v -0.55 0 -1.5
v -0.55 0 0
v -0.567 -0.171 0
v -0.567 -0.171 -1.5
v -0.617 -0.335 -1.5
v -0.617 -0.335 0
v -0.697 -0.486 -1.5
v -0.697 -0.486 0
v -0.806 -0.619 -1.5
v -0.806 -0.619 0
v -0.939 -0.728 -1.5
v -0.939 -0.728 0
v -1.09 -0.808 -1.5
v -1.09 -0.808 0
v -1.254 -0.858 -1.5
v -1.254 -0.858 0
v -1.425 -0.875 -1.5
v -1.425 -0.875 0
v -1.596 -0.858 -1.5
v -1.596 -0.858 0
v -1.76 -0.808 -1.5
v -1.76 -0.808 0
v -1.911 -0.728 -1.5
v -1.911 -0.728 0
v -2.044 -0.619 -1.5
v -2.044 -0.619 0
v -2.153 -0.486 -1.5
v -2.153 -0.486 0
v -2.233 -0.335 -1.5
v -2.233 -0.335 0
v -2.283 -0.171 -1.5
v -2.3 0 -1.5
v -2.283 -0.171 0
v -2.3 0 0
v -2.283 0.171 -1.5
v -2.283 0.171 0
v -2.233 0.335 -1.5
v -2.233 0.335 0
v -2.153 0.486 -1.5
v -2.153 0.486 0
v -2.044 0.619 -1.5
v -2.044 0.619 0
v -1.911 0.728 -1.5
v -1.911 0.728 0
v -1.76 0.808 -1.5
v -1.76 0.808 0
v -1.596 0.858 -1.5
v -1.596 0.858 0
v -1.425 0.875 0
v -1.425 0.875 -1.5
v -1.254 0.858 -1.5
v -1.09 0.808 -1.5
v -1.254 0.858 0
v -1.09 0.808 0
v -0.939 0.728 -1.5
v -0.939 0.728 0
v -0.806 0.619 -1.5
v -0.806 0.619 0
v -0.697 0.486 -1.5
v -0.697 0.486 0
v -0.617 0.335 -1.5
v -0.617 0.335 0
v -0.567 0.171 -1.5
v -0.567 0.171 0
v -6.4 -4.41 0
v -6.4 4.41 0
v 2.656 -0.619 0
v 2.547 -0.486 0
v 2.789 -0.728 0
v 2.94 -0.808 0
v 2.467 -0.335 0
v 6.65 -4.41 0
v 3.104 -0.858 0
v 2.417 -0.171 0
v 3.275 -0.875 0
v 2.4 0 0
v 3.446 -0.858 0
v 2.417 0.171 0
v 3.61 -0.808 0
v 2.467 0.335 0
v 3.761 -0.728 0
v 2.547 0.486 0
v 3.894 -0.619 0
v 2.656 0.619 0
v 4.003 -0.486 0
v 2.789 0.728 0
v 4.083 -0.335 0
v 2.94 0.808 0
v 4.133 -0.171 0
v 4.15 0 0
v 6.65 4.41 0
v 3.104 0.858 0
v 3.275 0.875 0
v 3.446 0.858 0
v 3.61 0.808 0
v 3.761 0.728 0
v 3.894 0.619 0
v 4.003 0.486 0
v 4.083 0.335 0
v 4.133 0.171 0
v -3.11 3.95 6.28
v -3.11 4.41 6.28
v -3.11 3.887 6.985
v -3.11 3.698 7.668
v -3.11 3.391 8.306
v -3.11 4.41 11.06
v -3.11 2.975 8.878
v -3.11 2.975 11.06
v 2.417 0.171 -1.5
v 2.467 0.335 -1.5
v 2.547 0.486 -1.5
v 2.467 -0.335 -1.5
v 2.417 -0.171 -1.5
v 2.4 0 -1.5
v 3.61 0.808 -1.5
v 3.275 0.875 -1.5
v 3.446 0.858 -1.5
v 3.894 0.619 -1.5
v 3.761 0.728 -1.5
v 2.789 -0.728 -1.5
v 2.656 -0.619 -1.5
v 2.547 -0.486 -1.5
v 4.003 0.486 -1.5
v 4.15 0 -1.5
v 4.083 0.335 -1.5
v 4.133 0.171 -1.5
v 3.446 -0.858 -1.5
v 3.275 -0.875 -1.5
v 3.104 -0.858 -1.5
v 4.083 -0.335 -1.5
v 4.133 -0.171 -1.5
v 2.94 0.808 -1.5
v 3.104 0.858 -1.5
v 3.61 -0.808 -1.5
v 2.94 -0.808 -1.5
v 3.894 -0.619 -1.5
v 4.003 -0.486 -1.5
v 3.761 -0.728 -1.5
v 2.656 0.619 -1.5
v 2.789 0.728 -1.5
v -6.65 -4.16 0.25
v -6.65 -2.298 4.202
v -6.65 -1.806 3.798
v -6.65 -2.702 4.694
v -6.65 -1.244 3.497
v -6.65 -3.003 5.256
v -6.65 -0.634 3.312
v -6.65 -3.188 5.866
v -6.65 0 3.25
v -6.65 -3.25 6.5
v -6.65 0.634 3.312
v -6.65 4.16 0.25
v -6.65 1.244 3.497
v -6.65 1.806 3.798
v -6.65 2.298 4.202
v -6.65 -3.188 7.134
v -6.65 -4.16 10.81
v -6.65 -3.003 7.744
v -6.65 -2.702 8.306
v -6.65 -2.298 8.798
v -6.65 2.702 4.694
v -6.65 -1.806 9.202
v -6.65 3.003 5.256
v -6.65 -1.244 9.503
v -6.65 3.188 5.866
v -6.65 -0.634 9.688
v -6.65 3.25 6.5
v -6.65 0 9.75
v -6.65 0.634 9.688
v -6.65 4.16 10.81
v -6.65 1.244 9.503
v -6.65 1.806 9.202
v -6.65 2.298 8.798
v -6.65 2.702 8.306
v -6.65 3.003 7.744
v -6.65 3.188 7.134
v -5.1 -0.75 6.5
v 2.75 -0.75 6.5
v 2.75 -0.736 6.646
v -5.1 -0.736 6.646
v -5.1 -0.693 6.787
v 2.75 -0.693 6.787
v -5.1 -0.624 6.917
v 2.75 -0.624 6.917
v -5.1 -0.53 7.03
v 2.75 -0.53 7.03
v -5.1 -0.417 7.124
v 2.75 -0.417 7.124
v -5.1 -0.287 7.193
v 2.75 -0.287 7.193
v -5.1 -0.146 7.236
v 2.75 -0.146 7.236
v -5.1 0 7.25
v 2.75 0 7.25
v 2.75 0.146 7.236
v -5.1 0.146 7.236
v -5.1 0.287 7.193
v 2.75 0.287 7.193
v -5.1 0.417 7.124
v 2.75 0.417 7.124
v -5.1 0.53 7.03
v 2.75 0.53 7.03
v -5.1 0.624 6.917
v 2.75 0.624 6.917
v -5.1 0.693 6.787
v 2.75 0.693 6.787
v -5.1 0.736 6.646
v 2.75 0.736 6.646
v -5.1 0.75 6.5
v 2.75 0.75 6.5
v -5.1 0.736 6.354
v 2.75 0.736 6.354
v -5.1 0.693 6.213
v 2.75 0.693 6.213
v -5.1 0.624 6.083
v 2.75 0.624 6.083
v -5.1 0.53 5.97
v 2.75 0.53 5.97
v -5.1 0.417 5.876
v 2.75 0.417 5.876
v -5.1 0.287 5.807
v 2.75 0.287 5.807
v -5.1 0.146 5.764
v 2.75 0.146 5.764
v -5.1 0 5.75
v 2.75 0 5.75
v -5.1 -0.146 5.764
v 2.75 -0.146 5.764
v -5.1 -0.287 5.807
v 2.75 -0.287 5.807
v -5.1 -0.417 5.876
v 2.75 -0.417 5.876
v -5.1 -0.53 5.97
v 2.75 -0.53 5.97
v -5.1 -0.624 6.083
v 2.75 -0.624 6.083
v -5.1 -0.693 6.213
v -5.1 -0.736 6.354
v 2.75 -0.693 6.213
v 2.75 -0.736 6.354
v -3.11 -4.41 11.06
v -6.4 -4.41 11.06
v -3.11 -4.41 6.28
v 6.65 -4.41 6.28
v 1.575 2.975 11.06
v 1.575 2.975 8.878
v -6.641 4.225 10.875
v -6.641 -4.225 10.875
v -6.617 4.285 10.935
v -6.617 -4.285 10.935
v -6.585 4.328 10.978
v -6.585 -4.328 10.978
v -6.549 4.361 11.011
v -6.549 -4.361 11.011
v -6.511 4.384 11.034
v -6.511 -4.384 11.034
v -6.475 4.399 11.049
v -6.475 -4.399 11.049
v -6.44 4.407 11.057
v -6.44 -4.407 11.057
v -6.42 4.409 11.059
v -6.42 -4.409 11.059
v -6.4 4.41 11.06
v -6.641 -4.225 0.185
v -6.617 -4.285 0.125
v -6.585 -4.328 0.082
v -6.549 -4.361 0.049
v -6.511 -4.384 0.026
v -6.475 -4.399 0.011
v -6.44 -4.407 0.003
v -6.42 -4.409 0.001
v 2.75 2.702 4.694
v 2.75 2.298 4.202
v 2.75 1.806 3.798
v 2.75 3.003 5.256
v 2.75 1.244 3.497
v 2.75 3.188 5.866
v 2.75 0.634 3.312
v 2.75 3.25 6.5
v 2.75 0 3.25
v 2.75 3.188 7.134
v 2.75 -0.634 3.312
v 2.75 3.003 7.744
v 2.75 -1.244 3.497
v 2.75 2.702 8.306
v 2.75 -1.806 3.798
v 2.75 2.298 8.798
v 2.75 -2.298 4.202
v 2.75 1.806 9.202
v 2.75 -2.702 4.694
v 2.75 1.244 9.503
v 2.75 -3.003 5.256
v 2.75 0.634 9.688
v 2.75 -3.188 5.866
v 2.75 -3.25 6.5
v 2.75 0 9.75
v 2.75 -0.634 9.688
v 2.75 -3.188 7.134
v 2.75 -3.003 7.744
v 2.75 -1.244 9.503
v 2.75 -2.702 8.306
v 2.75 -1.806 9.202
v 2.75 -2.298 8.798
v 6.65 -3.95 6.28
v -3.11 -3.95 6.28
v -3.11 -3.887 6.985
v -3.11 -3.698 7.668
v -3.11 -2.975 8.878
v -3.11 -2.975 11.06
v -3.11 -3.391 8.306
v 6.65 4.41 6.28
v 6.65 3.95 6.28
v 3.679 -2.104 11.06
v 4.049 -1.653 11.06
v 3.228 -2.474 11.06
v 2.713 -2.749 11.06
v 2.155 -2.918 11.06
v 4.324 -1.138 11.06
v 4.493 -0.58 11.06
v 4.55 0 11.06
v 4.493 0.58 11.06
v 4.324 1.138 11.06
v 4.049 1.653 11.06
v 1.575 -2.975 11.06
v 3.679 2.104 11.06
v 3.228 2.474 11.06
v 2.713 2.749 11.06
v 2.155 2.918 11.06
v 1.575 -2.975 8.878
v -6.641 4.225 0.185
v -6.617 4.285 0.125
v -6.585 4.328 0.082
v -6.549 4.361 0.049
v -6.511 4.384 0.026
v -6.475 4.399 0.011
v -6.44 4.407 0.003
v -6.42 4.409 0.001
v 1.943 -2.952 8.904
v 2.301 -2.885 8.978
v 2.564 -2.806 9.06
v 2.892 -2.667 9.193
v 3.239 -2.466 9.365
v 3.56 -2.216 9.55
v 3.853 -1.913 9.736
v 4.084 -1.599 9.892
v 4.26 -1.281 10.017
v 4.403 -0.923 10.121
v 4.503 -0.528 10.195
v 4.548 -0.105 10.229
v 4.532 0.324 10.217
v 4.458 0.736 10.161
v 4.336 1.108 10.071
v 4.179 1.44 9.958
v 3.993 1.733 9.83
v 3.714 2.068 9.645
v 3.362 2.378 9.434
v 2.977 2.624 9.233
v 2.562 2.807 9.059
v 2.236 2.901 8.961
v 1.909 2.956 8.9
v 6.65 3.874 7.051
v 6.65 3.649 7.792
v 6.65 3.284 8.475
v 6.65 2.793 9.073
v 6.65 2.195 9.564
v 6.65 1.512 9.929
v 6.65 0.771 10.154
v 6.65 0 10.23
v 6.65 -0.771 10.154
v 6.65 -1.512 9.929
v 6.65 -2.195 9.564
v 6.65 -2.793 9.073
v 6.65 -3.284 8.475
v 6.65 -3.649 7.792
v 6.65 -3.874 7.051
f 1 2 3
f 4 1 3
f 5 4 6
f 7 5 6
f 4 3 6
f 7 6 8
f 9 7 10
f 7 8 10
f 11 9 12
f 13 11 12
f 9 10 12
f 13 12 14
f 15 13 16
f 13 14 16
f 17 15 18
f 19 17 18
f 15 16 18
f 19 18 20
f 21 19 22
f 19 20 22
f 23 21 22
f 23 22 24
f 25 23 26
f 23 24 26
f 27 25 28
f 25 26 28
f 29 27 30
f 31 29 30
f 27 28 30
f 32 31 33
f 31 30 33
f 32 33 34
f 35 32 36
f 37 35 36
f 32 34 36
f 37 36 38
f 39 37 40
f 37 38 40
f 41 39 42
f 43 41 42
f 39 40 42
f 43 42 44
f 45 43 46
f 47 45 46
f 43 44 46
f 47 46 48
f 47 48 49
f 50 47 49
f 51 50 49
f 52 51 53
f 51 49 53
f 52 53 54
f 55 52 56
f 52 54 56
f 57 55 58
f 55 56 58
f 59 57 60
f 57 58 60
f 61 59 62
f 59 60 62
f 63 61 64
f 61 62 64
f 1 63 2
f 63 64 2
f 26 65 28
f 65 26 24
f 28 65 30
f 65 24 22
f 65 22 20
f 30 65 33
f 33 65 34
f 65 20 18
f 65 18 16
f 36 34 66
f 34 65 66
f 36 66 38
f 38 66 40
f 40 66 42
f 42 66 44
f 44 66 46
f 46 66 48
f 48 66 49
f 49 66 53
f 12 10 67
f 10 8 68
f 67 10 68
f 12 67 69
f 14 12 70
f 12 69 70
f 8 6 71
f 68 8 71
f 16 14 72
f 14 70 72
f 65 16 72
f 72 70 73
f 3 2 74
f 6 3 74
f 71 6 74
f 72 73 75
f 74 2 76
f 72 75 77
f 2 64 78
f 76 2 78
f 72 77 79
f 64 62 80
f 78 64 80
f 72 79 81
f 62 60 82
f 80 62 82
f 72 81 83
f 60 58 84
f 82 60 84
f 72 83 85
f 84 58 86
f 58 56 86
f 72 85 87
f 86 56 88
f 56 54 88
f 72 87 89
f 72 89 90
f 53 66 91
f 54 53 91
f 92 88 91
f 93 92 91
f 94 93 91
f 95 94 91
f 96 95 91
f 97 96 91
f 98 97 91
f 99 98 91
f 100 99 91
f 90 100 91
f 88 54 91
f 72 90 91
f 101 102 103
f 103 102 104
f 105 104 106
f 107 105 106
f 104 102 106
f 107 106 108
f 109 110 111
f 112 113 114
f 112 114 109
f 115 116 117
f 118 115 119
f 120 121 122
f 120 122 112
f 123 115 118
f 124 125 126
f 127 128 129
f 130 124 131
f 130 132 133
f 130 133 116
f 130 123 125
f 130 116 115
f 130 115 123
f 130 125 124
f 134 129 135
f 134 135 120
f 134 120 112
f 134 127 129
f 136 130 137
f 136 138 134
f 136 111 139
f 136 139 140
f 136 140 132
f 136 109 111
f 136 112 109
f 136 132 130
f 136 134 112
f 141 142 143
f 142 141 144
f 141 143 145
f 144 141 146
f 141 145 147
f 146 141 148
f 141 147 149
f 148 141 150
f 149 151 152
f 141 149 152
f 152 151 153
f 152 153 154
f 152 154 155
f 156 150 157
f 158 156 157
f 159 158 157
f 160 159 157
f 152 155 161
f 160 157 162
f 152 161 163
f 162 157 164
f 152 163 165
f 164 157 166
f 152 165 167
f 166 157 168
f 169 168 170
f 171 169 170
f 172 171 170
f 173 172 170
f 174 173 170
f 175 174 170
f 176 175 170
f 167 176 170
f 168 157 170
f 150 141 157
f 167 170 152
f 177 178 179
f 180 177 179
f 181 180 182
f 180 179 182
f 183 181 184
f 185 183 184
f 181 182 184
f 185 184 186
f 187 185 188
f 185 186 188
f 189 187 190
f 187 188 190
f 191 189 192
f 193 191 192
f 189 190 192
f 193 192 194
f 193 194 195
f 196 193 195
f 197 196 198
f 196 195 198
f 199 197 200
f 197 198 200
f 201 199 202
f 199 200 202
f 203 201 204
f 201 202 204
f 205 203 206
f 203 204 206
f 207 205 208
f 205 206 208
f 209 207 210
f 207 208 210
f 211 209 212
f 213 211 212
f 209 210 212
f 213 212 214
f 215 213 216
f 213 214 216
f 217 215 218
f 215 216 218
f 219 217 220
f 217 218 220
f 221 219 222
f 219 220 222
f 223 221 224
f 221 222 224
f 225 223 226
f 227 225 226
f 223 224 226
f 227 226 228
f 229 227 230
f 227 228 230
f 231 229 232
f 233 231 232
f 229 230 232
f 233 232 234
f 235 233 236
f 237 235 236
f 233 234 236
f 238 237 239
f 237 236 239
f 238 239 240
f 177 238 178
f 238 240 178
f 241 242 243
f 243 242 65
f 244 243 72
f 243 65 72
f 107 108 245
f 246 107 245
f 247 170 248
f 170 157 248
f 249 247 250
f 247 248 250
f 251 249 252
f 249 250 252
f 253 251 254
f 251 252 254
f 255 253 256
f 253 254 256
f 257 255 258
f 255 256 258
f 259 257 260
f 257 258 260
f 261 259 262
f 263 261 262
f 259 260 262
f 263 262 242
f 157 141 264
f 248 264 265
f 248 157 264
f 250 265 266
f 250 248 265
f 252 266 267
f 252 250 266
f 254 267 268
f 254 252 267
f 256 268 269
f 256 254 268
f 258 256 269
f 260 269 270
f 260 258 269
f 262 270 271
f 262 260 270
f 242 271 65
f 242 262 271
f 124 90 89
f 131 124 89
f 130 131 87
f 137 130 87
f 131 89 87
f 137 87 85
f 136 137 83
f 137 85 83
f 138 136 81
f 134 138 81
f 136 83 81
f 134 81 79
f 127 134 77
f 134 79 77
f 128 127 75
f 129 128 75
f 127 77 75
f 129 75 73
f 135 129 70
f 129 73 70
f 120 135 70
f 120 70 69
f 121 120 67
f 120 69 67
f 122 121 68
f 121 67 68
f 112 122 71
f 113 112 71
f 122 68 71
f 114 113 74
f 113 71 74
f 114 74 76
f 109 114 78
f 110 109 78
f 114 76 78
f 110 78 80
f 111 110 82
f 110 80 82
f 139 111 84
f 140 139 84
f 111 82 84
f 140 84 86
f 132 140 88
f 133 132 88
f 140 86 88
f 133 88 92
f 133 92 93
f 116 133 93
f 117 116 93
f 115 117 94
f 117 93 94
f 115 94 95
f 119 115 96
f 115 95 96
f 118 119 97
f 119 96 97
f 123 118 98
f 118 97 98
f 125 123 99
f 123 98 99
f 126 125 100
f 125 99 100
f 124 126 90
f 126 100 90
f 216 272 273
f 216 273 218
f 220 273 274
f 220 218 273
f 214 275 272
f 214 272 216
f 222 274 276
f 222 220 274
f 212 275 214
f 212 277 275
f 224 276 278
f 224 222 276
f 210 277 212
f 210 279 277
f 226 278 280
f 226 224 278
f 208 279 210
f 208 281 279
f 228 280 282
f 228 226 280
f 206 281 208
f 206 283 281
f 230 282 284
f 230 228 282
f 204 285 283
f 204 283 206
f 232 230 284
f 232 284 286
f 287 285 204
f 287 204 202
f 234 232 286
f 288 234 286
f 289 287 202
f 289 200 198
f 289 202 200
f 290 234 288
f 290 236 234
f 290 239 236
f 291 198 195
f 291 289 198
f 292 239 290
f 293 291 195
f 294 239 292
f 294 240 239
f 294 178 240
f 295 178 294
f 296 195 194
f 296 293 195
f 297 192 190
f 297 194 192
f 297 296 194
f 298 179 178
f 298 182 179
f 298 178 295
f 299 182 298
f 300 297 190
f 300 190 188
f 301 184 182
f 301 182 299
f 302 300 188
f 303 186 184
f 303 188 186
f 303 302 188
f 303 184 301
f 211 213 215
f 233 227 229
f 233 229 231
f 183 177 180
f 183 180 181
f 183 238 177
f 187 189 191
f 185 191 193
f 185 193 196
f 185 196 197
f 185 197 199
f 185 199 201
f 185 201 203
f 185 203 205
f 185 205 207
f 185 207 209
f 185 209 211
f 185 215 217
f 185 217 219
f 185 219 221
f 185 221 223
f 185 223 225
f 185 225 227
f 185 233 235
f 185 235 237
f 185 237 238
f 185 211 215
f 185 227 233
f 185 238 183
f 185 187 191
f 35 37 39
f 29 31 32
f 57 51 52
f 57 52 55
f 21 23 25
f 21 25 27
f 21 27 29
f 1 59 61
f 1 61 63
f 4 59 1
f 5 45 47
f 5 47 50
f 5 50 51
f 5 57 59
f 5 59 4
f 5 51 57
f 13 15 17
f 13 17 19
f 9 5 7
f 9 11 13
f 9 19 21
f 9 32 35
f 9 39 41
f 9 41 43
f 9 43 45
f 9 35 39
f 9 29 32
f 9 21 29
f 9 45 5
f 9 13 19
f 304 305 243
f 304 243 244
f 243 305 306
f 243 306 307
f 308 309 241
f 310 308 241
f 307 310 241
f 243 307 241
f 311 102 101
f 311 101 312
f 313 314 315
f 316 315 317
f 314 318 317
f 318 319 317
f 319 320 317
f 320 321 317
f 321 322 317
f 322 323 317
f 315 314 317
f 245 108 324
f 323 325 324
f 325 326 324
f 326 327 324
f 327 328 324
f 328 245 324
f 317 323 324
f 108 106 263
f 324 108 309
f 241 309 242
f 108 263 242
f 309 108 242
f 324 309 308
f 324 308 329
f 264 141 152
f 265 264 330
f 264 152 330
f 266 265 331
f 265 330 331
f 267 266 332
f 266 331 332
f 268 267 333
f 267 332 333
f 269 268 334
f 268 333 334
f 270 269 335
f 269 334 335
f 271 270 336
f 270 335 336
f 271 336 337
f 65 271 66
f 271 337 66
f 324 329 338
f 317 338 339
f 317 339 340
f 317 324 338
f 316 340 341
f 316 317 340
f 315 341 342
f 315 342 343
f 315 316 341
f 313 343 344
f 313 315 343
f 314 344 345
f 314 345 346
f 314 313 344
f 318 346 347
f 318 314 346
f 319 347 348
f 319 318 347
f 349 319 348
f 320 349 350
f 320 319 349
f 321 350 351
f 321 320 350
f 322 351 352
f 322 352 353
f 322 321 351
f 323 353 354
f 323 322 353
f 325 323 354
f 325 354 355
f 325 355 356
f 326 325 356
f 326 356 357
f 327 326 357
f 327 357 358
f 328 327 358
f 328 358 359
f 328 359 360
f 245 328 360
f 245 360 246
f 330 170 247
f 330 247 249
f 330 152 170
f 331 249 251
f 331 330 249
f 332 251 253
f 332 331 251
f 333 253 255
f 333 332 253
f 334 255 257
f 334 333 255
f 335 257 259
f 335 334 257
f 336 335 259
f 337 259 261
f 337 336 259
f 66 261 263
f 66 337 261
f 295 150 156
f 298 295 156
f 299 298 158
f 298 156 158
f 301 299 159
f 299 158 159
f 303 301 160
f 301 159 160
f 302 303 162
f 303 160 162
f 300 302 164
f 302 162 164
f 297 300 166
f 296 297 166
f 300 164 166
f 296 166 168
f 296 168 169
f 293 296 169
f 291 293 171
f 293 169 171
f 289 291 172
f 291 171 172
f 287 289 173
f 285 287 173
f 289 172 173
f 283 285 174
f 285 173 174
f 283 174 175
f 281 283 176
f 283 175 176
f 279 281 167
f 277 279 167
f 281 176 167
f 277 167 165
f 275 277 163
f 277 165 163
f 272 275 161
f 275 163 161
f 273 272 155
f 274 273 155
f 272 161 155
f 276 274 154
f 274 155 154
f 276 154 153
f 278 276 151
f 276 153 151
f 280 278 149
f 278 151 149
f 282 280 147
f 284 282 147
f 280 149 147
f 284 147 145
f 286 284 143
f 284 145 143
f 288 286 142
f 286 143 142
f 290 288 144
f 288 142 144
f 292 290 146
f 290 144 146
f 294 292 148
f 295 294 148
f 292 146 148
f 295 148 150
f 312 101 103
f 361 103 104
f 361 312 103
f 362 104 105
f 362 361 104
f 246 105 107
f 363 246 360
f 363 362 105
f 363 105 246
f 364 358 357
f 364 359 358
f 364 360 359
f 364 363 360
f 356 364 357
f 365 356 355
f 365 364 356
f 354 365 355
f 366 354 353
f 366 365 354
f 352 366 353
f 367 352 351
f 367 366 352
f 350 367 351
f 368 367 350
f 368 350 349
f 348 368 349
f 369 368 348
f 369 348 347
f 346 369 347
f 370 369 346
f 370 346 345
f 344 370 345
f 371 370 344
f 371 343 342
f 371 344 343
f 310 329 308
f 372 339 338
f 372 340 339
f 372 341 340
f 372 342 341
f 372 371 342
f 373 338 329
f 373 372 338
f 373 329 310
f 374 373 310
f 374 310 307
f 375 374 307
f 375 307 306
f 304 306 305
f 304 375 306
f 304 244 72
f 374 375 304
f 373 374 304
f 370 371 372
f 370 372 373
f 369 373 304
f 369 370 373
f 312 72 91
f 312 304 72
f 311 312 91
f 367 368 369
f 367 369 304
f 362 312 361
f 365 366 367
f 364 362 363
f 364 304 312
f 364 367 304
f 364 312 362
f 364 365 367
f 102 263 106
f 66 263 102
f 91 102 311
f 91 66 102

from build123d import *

# Parameters (mm, degrees)
F0_W      = 13.3
F0_H      = 8.82
F1_DEPTH  = 6.28
F2_R      = 3.95
F3_DEPTH  = 13.3
F4_W      = 8.82
F4_H      = 11.06
F5_DEPTH  = 3.54
F6_R      = 0.25
F7_W      = 4.685
F7_H      = 5.95
F9_R      = 3.25
F10_DEPTH = 9.4
F11_R     = 0.75
F12_DEPTH = 7.85
F13_R     = 0.875
F14_DEPTH = 1.5


with BuildPart() as f1:
    # F0 (on Top) → F1 (new body)
    with BuildSketch(Plane.XY):
        Rectangle(F0_W, F0_H)
    extrude(amount=F1_DEPTH)

    # F2 (on face) → F3 (join, through all)
    with BuildSketch(Plane.YZ.offset(6.65)):
        with Locations((0, 6.28)):
            Circle(F2_R)
    extrude(amount=-F3_DEPTH)

    # F4 (on face) → F5 (join)
    with BuildSketch(Plane(origin=(-6.65, 0, 0), x_dir=(0, -1, 0), z_dir=(-1, 0, 0))):
        with Locations((0, 5.53)):
            Rectangle(F4_W, F4_H)
    extrude(amount=-F5_DEPTH)

    # F6
    f6_edges = [f1.edges().sort_by_distance(p)[0] for p in [
        (-6.65, 0, 11.06),
        (-6.65, 4.41, 5.53),
        (-6.65, 0, 0),
        (-6.65, -4.41, 5.53),
    ]]
    fillet(f6_edges, radius=F6_R)

    # F7 (on face) → F8 (join, up to the next surface of F1)
    with BuildSketch(Plane.XY.offset(11.06)):
        with Locations((-0.7675, 0)):
            Rectangle(F7_W, F7_H)
        with BuildLine():
            Line((1.575, 2.975), (1.575, -2.975))
            ThreePointArc((1.575, -2.975), (4.55, 0), (1.575, 2.975))
        make_face()
    extrude(until=Until.NEXT, dir=(0, 0, -1))

    # F9 (on face) → F10 (cut)
    with BuildSketch(Plane(origin=(-6.65, 0, 0), x_dir=(0, -1, 0), z_dir=(-1, 0, 0))):
        with Locations((0, 6.5)):
            Circle(F9_R)
    extrude(amount=-F10_DEPTH, mode=Mode.SUBTRACT)

    # F11 (on face) → F12 (join)
    with BuildSketch(Plane(origin=(2.75, 0, 0), x_dir=(0, -1, 0), z_dir=(-1, 0, 0))):
        with Locations((0, 6.5)):
            Circle(F11_R)
    extrude(amount=F12_DEPTH)

    # F13 (on face) → F14 (join)
    with BuildSketch(Plane(origin=(0, 0, 0), x_dir=(1, 0, 0), z_dir=(0, 0, -1))):
        with Locations((-1.425, 0)):
            Circle(F13_R)
        with Locations((3.275, 0)):
            Circle(F13_R)
    extrude(amount=F14_DEPTH)


solid = f1.part
